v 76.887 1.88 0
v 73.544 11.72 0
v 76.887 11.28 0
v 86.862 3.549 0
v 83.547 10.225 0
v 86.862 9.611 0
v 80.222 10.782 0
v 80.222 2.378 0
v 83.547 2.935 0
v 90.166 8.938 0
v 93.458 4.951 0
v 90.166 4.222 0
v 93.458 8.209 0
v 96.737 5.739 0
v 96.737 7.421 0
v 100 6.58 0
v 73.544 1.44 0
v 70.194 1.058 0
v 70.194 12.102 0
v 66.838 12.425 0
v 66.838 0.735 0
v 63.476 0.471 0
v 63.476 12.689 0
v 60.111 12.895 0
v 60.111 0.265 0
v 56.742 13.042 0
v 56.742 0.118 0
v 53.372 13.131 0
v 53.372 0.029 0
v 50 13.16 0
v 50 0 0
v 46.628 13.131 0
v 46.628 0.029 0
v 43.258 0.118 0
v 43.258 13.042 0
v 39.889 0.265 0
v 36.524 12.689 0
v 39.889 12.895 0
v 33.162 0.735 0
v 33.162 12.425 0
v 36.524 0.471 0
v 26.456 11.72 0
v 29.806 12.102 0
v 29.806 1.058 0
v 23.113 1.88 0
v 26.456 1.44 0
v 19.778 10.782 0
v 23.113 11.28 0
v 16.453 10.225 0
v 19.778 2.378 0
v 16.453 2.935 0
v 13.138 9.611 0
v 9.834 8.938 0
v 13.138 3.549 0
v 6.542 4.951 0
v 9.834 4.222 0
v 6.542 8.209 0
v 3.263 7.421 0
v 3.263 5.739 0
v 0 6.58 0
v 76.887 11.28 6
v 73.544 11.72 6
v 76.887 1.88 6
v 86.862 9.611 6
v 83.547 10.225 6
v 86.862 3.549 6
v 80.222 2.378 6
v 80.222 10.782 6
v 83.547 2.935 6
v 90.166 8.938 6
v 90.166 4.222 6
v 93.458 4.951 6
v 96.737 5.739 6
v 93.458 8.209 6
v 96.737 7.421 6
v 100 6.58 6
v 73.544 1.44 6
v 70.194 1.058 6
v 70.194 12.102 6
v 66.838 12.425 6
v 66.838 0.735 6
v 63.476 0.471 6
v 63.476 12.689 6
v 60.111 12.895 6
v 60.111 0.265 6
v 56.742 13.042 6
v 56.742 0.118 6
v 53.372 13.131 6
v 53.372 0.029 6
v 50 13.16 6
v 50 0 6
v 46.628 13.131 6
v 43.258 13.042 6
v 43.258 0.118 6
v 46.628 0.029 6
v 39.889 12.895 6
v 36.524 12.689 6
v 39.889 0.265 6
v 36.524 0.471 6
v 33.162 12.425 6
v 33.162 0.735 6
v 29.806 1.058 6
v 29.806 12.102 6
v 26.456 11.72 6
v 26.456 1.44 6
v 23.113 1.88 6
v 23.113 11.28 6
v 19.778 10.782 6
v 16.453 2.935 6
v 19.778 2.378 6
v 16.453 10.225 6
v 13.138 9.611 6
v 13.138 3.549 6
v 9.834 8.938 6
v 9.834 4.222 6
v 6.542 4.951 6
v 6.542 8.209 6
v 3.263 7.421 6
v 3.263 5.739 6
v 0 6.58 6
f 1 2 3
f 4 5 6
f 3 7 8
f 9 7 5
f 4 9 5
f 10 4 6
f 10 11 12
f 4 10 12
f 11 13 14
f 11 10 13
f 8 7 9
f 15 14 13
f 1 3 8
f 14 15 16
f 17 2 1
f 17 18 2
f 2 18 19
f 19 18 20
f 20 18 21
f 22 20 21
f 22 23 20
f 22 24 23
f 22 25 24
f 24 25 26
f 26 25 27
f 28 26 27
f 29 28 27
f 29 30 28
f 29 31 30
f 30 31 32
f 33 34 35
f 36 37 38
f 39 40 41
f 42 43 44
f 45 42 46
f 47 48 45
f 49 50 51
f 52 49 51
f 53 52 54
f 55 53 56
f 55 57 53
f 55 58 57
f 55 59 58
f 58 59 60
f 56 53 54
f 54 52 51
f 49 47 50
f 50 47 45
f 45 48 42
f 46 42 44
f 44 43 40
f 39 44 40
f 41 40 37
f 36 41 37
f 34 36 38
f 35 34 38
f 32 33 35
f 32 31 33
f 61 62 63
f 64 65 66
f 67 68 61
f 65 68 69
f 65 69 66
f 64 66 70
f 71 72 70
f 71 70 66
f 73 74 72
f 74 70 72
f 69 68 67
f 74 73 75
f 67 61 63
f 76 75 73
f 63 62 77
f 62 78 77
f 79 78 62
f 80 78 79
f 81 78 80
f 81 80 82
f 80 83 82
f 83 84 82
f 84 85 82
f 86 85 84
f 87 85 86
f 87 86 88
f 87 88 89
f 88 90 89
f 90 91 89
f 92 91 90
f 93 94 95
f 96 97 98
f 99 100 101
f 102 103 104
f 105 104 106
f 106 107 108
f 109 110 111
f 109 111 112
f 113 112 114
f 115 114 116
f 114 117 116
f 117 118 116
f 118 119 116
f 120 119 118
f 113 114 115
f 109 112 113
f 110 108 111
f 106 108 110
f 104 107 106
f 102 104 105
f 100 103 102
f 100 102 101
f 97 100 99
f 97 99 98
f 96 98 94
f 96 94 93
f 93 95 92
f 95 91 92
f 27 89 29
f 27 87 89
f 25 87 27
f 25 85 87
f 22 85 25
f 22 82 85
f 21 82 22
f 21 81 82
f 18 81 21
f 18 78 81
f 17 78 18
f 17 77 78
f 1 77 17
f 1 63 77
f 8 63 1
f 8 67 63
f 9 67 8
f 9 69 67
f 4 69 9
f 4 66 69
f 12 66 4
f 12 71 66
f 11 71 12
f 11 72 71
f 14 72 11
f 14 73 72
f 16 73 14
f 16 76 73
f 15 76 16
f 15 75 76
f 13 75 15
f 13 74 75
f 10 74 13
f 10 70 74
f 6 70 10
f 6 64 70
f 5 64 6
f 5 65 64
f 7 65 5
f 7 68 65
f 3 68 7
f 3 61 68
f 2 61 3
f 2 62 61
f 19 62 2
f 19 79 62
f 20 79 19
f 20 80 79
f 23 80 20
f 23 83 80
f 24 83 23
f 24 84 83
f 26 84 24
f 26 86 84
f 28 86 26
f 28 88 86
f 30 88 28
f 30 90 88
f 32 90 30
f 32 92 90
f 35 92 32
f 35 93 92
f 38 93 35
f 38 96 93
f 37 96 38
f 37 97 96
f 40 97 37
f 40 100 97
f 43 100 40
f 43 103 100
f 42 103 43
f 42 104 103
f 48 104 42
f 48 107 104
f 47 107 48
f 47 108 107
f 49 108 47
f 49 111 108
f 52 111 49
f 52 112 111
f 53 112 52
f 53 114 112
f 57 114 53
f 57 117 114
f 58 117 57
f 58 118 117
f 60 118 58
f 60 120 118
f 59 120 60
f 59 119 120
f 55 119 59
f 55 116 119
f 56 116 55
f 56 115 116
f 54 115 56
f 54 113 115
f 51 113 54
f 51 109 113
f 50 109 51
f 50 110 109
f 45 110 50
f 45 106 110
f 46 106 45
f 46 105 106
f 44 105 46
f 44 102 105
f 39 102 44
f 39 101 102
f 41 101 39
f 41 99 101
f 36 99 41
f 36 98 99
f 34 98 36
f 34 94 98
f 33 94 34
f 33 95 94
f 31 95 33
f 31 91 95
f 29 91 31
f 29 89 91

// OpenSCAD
$fn = 32;

// ----------------------------------------------------------------------
// Arc profile plate: lens, 60 points
// ----------------------------------------------------------------------

// --- parameters (mm) ---
lens_chord = 100;         // chord length of the lens, X
arc_r = 193.19;           // radius of both arcs
arc_angle = 30;           // angle of each arc, degrees
sagitta = 6.58;           // bulge of each arc (half the lens height)
arc_step = 1;             // sampling step of the arcs, degrees
plate_t = 6;              // plate thickness, Z
fit_tol = 0.1;            // declared fit tolerance (prompt contract)
free_tol = 0.3;           // declared free tolerance (prompt contract)

bbox_y = 2 * sagitta;  // full lens height

profile = [[100, 6.58], [96.737, 7.421], [93.458, 8.209], [90.166, 8.938], [86.862, 9.611], [83.547, 10.225], [80.222, 10.782], [76.887, 11.28], [73.544, 11.72], [70.194, 12.102], [66.838, 12.425], [63.476, 12.689], [60.111, 12.895], [56.742, 13.042], [53.372, 13.131], [50, 13.16], [46.628, 13.131], [43.258, 13.042], [39.889, 12.895], [36.524, 12.689], [33.162, 12.425], [29.806, 12.102], [26.456, 11.72], [23.113, 11.28], [19.778, 10.782], [16.453, 10.225], [13.138, 9.611], [9.834, 8.938], [6.542, 8.209], [3.263, 7.421], [0, 6.58], [3.263, 5.739], [6.542, 4.951], [9.834, 4.222], [13.138, 3.549], [16.453, 2.935], [19.778, 2.378], [23.113, 1.88], [26.456, 1.44], [29.806, 1.058], [33.162, 0.735], [36.524, 0.471], [39.889, 0.265], [43.258, 0.118], [46.628, 0.029], [50, 0], [53.372, 0.029], [56.742, 0.118], [60.111, 0.265], [63.476, 0.471], [66.838, 0.735], [70.194, 1.058], [73.544, 1.44], [76.887, 1.88], [80.222, 2.378], [83.547, 2.935], [86.862, 3.549], [90.166, 4.222], [93.458, 4.951], [96.737, 5.739]];  // primary outline, 60 points, counter clockwise

// --- the one profile operation ---
linear_extrude(height = plate_t) polygon(points = profile);
